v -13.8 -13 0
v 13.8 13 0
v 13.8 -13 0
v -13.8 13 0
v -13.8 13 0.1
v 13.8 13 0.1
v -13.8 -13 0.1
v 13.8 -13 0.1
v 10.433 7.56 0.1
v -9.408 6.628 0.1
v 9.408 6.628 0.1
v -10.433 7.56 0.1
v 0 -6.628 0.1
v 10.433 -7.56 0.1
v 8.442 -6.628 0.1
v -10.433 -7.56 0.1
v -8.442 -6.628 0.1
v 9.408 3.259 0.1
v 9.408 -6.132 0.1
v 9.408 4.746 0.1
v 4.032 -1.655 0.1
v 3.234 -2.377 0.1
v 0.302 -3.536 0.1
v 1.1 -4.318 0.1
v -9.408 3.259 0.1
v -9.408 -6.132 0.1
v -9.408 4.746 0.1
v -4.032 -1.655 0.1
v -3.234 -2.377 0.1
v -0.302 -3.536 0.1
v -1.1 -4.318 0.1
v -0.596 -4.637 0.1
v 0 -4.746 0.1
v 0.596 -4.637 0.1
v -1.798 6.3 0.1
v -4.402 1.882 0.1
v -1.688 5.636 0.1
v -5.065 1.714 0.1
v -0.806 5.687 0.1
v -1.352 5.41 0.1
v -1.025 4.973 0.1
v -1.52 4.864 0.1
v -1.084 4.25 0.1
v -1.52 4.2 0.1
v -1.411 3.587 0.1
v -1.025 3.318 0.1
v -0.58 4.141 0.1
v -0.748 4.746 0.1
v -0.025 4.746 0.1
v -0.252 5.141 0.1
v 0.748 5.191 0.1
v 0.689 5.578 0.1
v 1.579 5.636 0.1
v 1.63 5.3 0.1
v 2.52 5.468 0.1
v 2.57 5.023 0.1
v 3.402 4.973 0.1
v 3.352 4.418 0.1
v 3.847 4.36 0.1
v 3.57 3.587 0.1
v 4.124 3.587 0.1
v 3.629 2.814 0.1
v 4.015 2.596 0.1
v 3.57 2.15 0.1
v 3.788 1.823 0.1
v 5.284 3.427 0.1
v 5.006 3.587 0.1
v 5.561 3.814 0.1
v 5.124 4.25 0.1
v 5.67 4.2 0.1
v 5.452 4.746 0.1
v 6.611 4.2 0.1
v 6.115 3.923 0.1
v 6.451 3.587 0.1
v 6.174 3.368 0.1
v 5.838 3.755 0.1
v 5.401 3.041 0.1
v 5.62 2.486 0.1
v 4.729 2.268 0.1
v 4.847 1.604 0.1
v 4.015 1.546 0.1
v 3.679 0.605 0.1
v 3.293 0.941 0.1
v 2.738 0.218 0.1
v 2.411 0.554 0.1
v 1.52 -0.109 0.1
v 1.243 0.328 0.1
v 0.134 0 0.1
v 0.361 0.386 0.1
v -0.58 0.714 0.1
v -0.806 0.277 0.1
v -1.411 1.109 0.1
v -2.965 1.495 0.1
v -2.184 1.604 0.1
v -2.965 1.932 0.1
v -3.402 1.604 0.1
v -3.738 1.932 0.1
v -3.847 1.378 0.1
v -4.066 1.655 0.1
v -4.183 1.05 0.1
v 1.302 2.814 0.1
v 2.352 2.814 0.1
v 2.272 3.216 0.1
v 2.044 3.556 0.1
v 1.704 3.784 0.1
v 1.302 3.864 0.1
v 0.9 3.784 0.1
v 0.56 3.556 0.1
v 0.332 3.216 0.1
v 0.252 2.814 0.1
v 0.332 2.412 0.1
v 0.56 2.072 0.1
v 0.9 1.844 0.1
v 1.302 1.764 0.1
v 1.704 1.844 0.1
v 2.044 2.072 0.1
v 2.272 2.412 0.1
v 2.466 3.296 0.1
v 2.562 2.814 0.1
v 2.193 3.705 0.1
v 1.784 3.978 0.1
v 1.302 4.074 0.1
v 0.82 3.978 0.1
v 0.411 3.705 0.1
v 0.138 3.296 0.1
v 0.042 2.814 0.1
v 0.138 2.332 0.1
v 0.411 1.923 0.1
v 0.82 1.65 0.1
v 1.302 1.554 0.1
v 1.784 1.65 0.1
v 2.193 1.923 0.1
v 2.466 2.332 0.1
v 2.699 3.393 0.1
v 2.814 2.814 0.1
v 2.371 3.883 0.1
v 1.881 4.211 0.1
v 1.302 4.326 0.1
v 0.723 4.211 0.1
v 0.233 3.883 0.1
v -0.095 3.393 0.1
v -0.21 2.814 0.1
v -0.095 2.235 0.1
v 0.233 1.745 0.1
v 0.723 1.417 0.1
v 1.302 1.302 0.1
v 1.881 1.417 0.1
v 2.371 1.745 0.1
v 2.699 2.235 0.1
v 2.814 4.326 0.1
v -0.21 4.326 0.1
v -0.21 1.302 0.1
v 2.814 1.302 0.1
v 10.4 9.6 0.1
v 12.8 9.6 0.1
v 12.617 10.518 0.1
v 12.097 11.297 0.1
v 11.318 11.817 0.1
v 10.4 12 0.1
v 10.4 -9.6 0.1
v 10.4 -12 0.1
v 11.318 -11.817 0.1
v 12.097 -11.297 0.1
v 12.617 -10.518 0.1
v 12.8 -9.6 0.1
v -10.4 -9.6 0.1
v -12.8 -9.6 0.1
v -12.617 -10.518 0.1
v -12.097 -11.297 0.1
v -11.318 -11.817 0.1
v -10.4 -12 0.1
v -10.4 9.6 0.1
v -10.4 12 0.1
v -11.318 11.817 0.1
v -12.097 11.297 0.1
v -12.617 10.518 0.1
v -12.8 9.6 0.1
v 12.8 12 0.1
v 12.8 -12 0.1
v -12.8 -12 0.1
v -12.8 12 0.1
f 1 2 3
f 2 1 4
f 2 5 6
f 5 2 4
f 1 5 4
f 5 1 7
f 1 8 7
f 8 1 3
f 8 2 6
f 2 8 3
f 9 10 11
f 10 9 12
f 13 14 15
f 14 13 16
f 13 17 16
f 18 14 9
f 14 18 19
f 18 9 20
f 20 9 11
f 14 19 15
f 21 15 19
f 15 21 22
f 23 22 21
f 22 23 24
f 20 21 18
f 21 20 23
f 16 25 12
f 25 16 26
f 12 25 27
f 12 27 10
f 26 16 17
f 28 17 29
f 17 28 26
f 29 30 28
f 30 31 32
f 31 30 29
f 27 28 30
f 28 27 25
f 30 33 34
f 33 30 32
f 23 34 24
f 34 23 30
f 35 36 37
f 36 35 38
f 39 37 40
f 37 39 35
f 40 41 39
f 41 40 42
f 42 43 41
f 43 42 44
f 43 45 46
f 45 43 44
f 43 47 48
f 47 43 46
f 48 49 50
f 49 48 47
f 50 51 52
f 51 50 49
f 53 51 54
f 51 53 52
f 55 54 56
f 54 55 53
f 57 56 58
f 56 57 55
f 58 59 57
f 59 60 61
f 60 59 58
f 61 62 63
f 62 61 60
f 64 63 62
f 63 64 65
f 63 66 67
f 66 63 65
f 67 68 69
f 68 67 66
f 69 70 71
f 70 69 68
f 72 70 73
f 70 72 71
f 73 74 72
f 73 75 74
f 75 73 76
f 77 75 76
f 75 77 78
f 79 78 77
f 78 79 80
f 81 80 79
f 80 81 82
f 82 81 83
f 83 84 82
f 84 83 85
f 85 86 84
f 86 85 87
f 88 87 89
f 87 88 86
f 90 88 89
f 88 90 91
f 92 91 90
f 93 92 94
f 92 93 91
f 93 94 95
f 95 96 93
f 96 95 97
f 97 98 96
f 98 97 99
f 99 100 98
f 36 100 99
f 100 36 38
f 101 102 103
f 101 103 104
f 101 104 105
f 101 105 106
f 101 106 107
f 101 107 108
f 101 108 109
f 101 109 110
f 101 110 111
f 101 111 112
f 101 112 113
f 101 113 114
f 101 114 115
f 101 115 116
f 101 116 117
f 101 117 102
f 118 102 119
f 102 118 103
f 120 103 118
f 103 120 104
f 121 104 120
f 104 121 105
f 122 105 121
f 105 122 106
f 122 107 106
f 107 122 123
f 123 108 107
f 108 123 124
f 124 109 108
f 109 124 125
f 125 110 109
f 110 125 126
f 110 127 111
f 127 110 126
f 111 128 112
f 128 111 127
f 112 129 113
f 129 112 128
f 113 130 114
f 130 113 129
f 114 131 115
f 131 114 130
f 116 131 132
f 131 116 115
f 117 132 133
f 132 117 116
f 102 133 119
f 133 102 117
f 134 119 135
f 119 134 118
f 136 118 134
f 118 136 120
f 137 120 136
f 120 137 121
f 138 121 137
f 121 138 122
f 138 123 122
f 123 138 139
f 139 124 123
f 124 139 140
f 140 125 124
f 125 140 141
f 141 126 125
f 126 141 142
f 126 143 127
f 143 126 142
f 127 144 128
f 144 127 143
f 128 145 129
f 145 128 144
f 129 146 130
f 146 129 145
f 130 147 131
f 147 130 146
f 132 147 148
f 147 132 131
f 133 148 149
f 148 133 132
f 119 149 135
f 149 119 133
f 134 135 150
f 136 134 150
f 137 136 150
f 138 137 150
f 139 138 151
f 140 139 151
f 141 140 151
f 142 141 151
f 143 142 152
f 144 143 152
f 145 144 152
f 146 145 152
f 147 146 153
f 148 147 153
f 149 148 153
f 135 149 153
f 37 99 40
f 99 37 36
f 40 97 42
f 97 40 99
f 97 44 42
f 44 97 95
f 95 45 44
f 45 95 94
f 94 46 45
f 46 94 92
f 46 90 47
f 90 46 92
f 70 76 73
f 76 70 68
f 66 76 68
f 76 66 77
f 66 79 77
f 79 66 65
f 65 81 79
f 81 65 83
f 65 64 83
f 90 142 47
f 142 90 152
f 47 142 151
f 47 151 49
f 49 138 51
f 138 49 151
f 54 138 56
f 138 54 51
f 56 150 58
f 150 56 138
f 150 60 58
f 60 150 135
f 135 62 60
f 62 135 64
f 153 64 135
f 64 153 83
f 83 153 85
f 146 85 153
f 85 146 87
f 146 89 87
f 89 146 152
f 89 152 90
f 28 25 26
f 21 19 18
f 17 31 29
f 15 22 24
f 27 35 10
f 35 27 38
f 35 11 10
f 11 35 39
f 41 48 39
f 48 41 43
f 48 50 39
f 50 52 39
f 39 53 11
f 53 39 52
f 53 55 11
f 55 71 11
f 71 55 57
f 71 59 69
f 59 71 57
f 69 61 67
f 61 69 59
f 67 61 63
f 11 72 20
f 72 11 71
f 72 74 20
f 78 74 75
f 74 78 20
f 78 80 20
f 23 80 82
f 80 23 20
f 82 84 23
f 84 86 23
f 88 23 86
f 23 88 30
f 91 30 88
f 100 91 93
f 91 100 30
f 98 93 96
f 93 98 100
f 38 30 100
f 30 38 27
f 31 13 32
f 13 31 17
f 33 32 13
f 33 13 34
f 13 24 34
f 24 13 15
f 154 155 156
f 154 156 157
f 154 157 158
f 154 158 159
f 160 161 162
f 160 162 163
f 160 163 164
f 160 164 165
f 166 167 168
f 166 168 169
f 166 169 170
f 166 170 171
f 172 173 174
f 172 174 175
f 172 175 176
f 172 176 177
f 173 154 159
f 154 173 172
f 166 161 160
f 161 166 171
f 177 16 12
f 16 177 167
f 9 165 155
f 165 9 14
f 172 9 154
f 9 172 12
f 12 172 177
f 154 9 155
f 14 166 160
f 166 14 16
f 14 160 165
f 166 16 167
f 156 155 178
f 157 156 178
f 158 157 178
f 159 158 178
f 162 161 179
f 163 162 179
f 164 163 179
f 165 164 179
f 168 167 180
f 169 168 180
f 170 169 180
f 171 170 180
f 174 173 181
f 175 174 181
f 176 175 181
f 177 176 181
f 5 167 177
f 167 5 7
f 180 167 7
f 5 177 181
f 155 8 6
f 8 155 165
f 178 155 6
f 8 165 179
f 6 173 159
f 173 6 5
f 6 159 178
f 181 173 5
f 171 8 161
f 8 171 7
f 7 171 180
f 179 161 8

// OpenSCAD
use <../lib.scad>
use <194215a.scad>
$fa=1; $fs=0.2;
function ldraw_lib__194145a(realsolid=false) = [
// 0 =Sticker  3.3 x  3.5 with Mail Logo
// 0 Name: 194145a.dat
// 0 Author: [PTadmin]
// 0 !LDRAW_ORG Part Alias UPDATE 2013-02
// 0 !LICENSE Licensed under CC BY 4.0 : see CAreadme.txt
// 
// 0 BFC CERTIFY CW
  [0,"BFC","CERTIFY"],
  [0,"BFC","CW"],
// 
// 0 !HISTORY 2011-12-29 [PTadmin] Official Update 2011-02
// 0 !HISTORY 2013-12-14 [cwdee] Add = prefix
// 0 !HISTORY 2013-12-23 [PTadmin] Official Update 2013-02
// 
// 
// 0 // Alias of 194215a
// 
// 1 16 0 0 0 1 0 0 0 1 0 0 0 1 194215a.dat
  [1,16,0,0,0,1,0,0,0,1,0,0,0,1, ldraw_lib__194215a(realsolid)],
// 0
];
module ldraw_lib__194145a(step=0, col=false, unit=2/5, alt=false, line=0.2, solid=!$preview)
    makepoly(ldraw_lib__194145a(solid), step=step, col=col, unit=unit, alt=alt, line=line, solid=solid);
ldraw_lib__194145a(line=0.2);
